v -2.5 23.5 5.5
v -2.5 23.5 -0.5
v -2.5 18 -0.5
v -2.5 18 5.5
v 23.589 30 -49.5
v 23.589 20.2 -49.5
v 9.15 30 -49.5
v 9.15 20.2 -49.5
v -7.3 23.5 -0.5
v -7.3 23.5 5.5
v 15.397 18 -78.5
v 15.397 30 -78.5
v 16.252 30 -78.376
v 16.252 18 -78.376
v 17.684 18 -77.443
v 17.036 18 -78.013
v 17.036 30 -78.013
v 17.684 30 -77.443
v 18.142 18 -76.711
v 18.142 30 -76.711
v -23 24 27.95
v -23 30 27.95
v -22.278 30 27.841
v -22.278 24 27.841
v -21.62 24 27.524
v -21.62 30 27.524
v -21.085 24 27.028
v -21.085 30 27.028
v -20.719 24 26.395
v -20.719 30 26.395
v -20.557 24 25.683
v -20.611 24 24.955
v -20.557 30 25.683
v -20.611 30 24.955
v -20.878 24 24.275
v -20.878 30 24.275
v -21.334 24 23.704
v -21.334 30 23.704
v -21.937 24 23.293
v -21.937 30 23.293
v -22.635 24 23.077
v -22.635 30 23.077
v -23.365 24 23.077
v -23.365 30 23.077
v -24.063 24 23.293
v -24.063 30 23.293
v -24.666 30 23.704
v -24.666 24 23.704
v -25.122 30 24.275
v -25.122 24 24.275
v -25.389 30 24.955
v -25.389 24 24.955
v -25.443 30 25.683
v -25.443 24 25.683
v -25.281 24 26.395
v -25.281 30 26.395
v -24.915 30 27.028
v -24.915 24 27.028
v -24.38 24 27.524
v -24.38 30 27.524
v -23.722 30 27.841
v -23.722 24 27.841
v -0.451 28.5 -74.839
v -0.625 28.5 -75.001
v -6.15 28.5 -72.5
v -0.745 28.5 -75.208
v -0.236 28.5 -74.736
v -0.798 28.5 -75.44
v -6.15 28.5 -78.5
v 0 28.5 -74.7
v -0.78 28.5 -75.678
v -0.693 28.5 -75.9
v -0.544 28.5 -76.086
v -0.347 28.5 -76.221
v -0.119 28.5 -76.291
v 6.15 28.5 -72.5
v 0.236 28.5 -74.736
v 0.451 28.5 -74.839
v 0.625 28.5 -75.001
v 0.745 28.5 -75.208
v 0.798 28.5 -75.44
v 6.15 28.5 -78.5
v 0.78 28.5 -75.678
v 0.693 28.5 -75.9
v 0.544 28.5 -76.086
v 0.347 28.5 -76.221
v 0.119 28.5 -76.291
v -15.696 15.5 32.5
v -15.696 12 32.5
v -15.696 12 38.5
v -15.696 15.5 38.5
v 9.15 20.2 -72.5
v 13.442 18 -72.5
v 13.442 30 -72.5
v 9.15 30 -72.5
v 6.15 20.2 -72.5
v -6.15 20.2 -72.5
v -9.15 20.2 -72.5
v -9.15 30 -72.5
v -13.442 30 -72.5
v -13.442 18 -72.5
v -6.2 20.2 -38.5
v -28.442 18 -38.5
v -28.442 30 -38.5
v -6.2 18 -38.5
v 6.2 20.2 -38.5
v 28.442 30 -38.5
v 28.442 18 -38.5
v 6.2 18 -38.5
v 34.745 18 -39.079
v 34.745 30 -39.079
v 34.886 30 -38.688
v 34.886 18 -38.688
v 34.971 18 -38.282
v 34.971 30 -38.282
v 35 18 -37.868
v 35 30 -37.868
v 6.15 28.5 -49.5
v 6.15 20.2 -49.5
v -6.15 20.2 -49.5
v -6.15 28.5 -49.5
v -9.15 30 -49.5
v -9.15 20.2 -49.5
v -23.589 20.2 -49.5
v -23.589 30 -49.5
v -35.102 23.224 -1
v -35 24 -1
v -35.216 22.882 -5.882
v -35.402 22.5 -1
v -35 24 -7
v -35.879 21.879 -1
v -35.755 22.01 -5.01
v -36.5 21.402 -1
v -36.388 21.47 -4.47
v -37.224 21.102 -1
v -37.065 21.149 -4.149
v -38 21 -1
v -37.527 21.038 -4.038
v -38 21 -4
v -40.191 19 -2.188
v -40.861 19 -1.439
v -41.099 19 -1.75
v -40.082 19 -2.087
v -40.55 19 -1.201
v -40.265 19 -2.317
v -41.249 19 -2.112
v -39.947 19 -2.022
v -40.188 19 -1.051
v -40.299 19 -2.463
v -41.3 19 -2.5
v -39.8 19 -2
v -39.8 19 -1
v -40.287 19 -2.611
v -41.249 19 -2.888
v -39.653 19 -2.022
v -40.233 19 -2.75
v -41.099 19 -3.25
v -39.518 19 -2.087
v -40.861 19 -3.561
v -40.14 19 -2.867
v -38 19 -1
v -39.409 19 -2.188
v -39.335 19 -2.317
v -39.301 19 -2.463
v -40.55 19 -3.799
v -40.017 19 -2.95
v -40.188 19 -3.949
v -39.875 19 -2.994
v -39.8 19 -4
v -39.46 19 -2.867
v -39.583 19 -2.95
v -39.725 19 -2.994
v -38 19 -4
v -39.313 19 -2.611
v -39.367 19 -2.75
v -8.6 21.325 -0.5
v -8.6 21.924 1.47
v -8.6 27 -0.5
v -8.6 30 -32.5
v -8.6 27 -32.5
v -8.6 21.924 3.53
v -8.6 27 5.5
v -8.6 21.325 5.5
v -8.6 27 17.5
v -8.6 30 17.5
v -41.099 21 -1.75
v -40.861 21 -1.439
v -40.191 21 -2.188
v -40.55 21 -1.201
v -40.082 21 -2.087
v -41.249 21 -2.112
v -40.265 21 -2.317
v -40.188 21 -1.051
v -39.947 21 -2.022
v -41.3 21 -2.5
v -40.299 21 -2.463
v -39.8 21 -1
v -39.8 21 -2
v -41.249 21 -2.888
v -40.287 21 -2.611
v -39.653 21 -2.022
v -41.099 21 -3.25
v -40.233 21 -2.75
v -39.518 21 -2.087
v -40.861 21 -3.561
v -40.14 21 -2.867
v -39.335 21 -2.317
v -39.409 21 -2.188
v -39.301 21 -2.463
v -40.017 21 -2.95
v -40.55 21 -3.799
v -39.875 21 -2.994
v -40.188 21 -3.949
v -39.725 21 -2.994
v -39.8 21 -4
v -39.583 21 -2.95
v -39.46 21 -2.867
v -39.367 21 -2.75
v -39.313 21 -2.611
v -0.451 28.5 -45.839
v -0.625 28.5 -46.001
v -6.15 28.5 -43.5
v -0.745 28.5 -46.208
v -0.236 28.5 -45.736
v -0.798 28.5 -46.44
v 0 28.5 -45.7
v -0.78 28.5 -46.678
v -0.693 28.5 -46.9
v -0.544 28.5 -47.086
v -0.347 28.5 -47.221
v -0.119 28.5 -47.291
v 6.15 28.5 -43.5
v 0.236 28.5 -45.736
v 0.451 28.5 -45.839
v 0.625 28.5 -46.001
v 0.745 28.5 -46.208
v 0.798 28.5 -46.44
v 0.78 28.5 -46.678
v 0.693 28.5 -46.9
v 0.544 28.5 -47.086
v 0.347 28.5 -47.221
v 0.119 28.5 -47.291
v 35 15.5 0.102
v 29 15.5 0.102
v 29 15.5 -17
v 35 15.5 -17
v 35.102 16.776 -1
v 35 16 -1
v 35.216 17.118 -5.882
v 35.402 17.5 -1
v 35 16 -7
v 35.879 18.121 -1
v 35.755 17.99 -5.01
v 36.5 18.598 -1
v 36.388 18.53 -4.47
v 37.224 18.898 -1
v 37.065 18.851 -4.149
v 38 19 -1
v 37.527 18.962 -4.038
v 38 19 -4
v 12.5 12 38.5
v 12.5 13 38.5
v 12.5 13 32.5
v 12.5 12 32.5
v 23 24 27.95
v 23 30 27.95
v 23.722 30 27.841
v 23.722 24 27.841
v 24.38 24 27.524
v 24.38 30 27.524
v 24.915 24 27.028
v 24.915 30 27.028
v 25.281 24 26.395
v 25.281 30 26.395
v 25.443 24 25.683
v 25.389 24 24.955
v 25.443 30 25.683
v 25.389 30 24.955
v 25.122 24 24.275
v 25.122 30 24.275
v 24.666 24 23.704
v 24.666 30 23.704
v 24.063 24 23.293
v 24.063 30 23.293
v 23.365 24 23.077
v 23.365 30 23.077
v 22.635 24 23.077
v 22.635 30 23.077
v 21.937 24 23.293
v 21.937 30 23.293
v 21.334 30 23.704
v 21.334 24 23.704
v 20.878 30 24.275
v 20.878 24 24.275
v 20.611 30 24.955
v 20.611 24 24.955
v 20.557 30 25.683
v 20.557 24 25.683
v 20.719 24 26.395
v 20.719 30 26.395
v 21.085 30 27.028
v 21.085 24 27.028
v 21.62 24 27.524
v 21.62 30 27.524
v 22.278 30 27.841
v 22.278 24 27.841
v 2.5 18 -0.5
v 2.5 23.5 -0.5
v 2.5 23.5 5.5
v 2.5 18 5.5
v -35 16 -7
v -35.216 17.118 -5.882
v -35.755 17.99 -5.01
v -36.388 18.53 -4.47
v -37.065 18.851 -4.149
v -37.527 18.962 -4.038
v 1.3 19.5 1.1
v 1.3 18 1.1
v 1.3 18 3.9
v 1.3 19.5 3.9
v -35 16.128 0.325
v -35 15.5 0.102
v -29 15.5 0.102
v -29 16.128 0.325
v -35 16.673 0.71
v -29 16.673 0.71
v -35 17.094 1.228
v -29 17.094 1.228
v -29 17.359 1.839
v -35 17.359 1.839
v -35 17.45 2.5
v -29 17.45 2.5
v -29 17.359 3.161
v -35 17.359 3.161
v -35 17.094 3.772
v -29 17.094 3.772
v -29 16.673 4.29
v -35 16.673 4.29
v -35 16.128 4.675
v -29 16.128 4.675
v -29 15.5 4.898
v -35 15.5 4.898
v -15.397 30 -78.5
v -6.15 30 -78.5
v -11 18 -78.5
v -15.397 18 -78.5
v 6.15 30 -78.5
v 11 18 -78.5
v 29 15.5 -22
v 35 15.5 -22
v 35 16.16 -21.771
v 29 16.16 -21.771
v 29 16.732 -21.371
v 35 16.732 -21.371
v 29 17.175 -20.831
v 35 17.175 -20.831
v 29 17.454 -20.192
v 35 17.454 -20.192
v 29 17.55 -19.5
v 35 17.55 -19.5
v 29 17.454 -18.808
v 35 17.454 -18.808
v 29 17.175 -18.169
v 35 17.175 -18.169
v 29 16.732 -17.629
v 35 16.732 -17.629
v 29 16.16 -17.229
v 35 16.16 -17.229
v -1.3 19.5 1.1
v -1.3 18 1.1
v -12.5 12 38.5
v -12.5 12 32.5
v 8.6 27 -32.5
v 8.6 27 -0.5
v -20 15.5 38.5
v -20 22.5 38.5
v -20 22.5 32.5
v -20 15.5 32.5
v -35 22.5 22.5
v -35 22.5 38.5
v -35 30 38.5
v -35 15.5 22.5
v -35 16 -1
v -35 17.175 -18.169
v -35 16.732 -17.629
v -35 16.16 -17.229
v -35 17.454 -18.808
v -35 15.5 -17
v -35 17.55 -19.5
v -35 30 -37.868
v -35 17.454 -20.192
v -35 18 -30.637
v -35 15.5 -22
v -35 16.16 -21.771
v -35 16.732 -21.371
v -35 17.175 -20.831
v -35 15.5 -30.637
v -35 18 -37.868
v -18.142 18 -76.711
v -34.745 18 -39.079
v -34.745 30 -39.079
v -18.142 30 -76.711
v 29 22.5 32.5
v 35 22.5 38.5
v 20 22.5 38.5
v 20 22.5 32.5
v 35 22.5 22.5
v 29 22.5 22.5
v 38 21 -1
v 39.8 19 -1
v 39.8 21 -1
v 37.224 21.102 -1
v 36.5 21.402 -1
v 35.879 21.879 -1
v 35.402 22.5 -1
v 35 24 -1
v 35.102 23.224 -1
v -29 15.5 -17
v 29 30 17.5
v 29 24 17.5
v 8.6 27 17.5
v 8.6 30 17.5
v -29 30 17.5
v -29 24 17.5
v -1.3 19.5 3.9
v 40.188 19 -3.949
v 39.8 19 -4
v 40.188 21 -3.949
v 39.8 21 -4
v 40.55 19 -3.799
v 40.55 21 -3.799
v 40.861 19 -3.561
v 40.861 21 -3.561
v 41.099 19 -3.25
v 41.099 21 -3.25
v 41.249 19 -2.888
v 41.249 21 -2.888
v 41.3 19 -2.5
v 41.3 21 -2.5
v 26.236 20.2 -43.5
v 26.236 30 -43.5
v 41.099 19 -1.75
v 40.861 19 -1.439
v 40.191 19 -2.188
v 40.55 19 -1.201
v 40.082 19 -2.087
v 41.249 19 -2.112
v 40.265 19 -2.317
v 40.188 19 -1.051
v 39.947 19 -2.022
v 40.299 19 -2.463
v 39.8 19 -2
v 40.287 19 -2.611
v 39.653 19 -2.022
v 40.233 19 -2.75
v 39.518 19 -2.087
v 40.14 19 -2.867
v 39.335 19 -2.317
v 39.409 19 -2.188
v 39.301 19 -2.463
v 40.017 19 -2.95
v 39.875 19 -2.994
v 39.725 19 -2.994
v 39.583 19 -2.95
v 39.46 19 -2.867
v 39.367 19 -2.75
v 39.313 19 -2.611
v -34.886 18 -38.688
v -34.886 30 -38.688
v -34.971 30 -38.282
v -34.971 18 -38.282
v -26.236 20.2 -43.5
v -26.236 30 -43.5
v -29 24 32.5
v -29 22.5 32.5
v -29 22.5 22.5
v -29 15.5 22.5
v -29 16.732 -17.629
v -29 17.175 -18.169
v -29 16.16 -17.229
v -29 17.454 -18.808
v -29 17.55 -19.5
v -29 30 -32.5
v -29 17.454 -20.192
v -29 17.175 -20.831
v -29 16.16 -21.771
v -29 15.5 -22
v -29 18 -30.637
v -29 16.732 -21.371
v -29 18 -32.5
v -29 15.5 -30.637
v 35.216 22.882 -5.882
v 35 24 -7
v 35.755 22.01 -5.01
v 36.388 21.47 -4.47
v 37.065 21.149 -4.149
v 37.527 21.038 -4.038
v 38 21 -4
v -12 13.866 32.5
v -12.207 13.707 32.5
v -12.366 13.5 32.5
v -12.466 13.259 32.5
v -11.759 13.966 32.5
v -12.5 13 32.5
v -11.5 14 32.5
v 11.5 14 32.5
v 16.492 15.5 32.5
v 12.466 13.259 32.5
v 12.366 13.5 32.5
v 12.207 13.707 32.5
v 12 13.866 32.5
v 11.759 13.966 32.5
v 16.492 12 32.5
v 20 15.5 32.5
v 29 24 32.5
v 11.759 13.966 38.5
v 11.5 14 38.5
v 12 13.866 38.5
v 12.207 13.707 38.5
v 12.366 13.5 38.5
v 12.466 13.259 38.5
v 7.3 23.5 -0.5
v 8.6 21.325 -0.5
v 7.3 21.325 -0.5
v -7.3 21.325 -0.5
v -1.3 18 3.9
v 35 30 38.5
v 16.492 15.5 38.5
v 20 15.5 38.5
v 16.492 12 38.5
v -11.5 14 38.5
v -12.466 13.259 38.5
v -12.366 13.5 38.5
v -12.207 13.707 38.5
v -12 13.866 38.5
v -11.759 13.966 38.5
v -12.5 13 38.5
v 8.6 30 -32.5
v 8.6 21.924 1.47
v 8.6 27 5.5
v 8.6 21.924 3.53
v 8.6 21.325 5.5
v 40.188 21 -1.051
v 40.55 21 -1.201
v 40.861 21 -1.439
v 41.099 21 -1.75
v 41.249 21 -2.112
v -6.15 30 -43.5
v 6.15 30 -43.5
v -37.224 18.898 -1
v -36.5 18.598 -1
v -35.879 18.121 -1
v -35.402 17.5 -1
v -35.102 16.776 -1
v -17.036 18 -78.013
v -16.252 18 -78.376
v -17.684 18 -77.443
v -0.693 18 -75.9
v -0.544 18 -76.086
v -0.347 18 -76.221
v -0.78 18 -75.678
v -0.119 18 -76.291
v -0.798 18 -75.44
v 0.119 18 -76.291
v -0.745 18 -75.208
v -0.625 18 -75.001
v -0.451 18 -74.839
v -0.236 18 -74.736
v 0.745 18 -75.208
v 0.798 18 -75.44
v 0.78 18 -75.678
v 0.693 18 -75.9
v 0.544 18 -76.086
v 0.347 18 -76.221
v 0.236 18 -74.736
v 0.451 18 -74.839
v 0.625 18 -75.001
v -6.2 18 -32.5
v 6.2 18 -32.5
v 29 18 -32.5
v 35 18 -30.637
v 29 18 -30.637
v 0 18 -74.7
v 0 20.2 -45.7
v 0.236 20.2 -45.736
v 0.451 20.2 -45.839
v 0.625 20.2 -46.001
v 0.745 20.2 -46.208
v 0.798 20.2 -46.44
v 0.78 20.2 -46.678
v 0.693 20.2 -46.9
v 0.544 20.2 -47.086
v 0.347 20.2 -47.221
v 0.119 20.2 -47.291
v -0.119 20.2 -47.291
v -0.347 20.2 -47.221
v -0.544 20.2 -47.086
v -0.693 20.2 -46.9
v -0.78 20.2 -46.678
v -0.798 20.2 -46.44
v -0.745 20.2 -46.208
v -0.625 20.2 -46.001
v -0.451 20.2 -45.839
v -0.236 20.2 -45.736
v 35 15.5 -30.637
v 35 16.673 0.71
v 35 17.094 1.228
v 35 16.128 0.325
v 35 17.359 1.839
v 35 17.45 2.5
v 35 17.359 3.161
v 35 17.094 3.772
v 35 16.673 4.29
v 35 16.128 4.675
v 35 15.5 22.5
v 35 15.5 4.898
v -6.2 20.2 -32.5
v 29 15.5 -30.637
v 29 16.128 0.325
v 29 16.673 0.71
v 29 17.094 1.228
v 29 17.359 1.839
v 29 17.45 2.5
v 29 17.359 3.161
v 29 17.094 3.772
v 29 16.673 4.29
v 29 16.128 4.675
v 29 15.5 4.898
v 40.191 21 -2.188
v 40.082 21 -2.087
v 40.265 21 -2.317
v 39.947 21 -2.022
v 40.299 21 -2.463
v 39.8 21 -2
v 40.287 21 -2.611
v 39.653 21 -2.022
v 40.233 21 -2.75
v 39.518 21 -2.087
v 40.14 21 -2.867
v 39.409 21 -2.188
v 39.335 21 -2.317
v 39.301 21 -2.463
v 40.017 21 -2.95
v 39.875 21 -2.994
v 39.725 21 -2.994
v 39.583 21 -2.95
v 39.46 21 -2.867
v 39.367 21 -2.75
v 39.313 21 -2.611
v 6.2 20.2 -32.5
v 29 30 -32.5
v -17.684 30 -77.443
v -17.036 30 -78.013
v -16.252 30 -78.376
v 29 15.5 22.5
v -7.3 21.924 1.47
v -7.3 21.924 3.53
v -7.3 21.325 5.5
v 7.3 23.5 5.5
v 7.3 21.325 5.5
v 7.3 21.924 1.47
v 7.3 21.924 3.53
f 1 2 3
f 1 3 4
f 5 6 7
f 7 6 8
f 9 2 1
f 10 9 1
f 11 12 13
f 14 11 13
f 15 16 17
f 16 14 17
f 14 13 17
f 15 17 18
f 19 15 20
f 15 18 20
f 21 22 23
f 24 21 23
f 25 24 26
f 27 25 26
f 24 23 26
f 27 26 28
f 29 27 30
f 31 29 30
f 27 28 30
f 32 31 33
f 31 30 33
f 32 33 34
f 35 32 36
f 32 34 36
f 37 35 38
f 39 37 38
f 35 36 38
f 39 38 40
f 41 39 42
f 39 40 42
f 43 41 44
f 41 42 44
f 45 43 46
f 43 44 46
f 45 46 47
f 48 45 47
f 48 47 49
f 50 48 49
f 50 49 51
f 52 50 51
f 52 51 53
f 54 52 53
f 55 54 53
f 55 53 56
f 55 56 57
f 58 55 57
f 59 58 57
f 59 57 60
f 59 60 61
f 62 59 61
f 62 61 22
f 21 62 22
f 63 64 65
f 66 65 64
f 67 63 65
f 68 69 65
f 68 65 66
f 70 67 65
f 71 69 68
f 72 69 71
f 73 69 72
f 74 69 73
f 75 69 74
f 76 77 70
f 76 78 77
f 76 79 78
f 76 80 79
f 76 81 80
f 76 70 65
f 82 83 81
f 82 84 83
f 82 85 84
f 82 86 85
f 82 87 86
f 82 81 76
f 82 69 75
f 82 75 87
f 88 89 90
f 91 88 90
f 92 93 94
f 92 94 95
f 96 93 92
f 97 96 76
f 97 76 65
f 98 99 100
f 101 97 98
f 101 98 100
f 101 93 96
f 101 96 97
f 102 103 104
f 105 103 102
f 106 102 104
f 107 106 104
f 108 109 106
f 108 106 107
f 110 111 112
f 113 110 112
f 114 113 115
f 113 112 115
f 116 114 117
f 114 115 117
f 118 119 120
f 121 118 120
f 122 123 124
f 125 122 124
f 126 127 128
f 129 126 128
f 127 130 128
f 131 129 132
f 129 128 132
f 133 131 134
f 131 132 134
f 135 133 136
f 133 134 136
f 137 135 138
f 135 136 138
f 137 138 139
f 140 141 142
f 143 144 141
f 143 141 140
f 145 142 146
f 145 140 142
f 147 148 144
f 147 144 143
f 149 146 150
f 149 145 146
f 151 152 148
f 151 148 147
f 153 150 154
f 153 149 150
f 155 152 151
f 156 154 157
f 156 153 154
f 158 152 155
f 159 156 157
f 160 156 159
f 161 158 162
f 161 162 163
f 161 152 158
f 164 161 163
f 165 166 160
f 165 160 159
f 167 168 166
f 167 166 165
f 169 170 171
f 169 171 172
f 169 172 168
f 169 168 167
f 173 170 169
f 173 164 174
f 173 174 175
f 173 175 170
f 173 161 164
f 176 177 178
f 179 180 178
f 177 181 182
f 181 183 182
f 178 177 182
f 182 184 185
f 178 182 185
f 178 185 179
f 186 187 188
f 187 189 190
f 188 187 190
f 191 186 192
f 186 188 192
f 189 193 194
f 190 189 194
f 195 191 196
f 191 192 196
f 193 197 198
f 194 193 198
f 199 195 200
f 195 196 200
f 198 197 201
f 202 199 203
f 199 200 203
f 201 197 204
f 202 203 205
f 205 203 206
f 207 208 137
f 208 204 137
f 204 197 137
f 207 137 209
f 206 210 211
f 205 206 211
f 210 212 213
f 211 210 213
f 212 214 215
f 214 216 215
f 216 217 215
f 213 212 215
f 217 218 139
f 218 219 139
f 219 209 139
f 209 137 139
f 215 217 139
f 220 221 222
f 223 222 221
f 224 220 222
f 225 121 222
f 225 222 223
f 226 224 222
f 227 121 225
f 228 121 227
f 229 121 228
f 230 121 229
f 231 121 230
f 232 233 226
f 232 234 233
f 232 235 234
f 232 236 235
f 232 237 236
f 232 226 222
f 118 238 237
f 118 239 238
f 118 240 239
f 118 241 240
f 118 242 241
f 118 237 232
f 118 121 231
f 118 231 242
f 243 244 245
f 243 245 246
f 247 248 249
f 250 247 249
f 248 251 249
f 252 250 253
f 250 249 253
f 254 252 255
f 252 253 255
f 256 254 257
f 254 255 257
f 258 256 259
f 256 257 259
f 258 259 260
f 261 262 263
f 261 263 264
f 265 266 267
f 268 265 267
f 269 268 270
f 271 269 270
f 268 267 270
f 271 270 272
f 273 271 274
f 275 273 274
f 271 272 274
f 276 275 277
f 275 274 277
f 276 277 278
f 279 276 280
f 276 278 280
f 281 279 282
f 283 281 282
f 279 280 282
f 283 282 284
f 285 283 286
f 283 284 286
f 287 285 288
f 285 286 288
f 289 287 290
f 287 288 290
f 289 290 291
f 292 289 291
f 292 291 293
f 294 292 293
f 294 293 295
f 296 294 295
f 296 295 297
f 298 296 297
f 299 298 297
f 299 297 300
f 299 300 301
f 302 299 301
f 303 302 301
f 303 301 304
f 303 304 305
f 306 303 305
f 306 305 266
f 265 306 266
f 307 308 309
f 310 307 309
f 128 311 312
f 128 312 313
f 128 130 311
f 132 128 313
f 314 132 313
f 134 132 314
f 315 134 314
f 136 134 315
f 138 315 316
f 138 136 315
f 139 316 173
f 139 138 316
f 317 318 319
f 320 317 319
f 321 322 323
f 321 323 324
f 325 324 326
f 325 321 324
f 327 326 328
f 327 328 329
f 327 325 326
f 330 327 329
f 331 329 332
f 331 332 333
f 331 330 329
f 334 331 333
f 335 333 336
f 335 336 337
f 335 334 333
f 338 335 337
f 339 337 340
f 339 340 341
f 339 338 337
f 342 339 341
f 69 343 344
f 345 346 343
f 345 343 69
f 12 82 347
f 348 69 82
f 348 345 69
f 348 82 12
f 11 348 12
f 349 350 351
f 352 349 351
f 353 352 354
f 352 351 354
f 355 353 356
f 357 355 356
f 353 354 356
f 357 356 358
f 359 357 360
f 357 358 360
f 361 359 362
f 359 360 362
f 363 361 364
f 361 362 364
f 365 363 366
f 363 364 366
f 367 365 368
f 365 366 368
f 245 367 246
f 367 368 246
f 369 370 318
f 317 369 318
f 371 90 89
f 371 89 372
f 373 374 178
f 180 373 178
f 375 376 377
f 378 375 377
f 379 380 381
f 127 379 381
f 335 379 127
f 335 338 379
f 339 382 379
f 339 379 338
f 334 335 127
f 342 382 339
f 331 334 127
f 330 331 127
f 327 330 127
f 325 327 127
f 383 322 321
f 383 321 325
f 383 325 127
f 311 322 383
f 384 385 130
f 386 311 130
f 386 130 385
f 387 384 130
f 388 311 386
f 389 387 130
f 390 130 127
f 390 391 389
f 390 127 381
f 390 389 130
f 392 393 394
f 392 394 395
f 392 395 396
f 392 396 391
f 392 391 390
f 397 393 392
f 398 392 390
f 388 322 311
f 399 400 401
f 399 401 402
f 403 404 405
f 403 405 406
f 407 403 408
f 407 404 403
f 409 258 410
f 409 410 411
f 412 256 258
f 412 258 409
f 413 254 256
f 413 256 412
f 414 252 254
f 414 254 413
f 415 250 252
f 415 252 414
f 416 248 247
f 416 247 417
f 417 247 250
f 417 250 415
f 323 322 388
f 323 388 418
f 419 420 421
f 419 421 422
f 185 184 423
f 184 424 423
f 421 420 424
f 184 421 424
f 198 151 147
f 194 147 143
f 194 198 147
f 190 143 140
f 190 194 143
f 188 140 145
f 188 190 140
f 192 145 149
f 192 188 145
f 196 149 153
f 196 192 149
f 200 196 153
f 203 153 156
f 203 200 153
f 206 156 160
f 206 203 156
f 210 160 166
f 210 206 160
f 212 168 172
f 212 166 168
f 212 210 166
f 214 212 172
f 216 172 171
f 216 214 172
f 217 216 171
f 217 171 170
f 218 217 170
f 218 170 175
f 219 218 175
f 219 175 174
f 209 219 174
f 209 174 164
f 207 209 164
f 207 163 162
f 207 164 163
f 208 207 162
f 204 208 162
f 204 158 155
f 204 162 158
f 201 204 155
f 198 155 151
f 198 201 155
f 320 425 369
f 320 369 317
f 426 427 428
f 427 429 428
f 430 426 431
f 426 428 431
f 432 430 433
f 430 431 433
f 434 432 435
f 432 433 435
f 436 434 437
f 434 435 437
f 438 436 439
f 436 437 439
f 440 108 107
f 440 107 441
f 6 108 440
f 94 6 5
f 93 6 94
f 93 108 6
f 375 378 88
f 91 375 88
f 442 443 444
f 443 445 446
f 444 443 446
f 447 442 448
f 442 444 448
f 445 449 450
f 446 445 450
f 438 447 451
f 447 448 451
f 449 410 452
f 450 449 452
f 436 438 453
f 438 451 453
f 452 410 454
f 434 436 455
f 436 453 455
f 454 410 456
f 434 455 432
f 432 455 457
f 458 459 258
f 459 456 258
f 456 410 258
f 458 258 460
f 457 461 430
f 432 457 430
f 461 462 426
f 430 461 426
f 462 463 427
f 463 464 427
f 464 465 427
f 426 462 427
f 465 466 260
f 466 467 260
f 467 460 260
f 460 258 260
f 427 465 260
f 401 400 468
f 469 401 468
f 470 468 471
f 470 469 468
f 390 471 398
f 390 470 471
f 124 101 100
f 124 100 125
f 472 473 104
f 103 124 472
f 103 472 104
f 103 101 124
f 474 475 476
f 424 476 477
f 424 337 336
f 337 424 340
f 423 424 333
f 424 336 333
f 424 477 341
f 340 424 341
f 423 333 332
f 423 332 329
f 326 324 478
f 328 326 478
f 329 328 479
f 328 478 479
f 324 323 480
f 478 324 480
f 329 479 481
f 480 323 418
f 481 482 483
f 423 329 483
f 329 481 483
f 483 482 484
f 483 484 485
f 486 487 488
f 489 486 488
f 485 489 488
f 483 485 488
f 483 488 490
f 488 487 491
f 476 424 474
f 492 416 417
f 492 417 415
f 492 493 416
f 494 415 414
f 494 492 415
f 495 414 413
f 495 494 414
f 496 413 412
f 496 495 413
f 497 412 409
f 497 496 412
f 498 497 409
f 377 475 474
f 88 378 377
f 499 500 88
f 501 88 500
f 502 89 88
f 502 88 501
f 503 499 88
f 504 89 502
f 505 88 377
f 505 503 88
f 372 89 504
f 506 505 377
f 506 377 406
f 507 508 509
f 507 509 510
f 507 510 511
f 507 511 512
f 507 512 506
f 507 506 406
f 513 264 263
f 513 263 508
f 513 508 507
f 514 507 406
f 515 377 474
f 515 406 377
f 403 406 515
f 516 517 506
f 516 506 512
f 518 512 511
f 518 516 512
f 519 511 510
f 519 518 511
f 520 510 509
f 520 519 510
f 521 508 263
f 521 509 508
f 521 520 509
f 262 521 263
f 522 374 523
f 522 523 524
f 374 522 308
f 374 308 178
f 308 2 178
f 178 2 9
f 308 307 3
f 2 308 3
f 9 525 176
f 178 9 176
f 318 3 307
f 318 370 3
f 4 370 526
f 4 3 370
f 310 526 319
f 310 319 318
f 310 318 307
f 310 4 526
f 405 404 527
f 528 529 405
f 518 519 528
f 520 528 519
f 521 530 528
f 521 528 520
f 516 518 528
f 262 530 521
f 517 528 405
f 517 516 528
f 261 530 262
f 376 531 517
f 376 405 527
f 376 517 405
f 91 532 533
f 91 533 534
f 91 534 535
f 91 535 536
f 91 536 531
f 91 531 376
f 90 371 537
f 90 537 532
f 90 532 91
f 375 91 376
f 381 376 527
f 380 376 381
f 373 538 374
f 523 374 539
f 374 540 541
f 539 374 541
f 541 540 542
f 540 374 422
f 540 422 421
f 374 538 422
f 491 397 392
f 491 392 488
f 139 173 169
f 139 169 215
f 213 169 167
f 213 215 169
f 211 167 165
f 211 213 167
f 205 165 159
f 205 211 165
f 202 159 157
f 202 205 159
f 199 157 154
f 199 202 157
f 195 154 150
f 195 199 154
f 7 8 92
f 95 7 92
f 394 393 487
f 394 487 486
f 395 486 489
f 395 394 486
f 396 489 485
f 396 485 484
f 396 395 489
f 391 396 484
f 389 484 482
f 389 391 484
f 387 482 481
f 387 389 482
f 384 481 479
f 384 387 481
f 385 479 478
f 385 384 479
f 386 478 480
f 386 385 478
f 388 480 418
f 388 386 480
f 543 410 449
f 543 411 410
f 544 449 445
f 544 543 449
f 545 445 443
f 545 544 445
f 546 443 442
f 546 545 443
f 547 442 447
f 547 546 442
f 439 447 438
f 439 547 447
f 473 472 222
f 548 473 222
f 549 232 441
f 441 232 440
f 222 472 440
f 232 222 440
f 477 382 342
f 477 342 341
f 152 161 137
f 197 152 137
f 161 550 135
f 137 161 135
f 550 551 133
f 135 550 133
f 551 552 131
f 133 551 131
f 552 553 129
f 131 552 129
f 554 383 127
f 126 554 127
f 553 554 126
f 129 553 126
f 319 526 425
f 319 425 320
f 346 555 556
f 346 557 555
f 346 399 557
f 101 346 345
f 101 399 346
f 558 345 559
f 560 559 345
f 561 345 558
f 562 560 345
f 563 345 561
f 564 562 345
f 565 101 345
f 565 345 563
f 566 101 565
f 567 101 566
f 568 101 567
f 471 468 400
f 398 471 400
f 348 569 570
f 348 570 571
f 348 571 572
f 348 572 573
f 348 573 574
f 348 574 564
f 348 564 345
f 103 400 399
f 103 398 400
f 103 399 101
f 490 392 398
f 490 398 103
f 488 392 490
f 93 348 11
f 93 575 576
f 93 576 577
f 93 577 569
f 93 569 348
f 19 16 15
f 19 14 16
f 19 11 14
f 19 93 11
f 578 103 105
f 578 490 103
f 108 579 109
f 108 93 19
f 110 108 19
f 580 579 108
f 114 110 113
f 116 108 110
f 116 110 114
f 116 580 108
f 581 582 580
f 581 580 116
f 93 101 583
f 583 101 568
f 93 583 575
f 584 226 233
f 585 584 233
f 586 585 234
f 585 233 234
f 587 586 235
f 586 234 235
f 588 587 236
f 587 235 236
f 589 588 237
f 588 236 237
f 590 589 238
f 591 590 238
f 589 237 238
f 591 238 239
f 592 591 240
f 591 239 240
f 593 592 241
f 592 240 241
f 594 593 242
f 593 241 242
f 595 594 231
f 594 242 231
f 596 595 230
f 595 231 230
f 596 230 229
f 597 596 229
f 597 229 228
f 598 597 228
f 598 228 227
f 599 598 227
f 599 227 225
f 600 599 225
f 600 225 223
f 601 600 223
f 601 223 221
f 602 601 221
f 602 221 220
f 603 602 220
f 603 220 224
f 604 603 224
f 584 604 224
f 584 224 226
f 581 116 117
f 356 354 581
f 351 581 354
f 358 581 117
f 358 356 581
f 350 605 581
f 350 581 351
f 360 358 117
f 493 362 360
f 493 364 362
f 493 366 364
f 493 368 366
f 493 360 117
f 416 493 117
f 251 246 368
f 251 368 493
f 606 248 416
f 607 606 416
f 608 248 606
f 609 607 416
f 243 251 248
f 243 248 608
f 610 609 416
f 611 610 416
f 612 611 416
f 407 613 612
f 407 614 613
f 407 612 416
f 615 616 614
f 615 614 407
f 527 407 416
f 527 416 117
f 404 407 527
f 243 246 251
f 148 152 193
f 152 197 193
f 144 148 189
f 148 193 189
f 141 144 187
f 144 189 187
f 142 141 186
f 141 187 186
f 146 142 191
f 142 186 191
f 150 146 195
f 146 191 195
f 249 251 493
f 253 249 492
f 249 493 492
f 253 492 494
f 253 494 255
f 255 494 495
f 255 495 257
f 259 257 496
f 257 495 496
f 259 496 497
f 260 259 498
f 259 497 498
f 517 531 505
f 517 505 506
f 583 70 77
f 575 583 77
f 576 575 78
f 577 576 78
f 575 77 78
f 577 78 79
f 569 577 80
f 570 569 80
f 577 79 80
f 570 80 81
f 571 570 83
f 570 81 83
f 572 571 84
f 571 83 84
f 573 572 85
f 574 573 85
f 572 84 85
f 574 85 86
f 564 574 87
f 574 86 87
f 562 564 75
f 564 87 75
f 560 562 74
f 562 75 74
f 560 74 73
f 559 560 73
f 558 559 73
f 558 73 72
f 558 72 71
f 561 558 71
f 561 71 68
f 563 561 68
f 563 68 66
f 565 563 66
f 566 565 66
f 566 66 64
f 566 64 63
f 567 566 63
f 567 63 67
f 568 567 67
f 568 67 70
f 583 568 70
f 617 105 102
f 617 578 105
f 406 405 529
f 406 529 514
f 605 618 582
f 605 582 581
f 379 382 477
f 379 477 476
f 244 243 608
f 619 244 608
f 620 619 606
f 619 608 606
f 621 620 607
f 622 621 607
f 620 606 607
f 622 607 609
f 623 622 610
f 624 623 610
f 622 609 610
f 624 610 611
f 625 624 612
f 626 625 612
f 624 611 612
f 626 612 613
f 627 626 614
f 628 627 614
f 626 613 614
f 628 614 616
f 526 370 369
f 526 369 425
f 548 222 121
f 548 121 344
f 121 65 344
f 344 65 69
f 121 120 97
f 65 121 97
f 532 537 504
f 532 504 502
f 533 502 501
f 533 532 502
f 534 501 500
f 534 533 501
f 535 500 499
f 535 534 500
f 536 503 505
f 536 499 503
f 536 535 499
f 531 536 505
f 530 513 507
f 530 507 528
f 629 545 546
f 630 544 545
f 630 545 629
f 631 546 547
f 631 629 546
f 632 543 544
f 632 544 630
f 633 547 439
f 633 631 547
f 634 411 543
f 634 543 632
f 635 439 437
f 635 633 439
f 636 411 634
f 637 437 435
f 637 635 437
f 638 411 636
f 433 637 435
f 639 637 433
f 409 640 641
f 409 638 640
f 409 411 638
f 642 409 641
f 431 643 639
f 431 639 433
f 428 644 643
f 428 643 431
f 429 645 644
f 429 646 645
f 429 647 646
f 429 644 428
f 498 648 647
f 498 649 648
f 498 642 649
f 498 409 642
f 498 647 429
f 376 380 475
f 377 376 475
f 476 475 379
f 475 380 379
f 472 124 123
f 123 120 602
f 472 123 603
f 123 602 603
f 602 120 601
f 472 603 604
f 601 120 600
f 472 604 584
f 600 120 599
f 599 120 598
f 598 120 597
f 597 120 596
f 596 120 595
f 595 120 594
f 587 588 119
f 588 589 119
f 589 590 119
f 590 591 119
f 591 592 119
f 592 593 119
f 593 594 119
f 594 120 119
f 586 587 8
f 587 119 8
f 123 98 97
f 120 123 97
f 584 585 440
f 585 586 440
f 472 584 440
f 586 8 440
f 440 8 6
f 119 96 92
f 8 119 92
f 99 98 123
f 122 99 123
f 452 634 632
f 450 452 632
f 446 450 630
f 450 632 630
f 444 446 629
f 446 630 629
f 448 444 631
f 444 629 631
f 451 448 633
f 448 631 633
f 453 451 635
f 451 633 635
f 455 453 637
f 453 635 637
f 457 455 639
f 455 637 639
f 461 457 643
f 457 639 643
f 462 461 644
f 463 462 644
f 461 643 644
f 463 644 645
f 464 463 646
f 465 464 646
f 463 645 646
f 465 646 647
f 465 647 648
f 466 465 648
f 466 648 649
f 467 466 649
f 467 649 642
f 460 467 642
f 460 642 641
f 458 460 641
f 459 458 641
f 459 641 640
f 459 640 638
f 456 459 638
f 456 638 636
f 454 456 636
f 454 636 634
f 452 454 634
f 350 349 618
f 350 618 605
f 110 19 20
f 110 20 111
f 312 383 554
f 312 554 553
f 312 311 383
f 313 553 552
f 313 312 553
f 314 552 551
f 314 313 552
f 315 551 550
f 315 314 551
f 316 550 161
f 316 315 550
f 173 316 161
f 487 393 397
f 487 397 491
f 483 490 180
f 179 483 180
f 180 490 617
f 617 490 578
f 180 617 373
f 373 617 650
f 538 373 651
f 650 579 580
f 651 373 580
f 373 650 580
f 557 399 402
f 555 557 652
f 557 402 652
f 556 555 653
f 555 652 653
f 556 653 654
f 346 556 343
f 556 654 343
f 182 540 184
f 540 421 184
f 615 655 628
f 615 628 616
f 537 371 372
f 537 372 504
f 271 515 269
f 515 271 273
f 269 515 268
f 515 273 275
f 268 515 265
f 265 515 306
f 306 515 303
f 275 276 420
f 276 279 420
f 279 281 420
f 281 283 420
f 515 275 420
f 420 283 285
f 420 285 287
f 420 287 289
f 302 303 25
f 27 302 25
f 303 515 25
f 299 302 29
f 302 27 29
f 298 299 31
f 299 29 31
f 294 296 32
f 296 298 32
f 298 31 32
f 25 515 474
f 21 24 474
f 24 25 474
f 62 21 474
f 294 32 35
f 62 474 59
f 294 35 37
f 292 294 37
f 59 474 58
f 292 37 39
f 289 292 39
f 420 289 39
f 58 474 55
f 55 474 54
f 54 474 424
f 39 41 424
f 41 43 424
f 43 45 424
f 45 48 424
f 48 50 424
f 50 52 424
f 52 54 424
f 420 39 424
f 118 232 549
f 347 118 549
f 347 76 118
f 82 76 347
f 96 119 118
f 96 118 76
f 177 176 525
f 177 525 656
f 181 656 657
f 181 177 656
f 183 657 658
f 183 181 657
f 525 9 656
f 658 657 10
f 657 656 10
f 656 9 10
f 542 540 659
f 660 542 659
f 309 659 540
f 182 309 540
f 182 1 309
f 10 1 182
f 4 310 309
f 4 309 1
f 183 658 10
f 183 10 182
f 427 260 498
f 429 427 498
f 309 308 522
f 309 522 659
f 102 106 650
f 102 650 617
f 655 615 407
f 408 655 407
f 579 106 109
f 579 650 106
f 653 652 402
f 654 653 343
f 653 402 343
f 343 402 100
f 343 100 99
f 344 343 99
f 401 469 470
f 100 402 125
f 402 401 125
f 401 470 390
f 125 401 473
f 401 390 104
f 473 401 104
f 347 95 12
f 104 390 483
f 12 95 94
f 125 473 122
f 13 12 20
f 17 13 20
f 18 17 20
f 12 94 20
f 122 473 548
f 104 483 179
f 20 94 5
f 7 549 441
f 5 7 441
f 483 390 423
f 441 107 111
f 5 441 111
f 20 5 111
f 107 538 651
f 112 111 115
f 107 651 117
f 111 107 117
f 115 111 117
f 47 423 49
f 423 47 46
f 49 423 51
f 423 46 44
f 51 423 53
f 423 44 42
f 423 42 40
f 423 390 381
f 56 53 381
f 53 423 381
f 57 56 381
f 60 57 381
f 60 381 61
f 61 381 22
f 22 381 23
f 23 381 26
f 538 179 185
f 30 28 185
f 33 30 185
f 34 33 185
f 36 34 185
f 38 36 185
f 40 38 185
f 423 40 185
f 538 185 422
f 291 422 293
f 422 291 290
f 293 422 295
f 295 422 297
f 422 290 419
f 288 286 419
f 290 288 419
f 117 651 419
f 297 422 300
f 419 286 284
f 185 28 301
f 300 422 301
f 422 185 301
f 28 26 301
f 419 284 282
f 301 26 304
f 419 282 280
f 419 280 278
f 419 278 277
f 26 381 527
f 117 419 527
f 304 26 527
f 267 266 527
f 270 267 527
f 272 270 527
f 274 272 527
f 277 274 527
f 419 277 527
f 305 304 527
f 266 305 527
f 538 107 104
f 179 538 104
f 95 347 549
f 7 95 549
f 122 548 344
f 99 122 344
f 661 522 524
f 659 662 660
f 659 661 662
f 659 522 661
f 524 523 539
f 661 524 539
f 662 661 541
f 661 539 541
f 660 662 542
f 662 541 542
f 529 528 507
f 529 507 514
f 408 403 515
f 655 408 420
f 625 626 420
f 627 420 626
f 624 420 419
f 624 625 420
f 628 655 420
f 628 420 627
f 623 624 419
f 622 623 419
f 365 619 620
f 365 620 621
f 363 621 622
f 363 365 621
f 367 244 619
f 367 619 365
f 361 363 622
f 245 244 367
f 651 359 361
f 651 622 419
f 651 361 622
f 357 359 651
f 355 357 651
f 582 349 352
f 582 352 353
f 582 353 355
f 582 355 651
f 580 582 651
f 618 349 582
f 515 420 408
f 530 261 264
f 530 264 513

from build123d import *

# Parameters (mm, degrees)
SKETCH1_W               = 58
SKETCH1_H               = 65
BOSS_EXTRUDE1_DEPTH     = 30
BOSS_EXTRUDE3_REACH     = 92.09
SKETCH10_W              = 5
SKETCH10_H              = 6
CUT_EXTRUDE1_REACH      = 111.372
SKETCH2_R               = 2.45
SKETCH2_R_2             = 2.55
CUT_EXTRUDE2_REACH      = 91.744
SKETCH3_W               = 12.4
SKETCH3_H               = 10.4
SKETCH11_W              = 3
SKETCH11_H              = 2
BOSS_EXTRUDE4_DEPTH     = 6.3
FILLET3_R               = 1.5
SKETCH12_R              = 0.5
CUT_EXTRUDE3_DEPTH      = 92.15338732
FILLET3_OF_MIRROR1_R    = 1.5
BOSS_EXTRUDE5_REACH     = 111.564
SKETCH13_W              = 15
SKETCH13_H              = 6
BOSS_EXTRUDE6_REACH     = 111.564
SKETCH17_W              = 15
SKETCH17_H              = 14
SKETCH14_R              = 2.45
CUT_EXTRUDE4_DEPTH      = 94.637279017
SKETCH16_W              = 16
SKETCH16_H              = 7
CUT_EXTRUDE7_DEPTH      = 15
CUT_EXTRUDE8_REACH      = 129.651
CUT_EXTRUDE9_START      = -6
SKETCH19_W              = 30
SKETCH19_H              = 15
CUT_EXTRUDE9_DEPTH      = 18
CUT_EXTRUDE18_REACH     = 129.651
SKETCH35_W              = 16
SKETCH35_H              = 6
FILLET5_R               = 3
BOSS_EXTRUDE7_START     = 20.2
BOSS_EXTRUDE7_DEPTH     = 9.8
CUT_EXTRUDE12_REACH     = 109.009
CUT_EXTRUDE12_START     = 16.5
SKETCH23_W              = 12.3
SKETCH23_H              = 6
BOSS_EXTRUDE8_DEPTH     = 20
CUT_EXTRUDE15_REACH     = 95.168
SKETCH28_R              = 0.8
FILLET4_R               = 3
CUT_EXTRUDE16_REACH     = 96.767
SKETCH29_R              = 1.6
SKETCH30_W              = 6
SKETCH30_H              = 3.5
BOSS_EXTRUDE9_DEPTH     = 6.1
SKETCH31_W              = 1.3
SKETCH31_H              = 6
BOSS_EXTRUDE10_DEPTH    = 5
CUT_EXTRUDE17_REACH     = 99.736
MIRROR5_COPY_1_SKETCH_W = 6
MIRROR5_COPY_1_SKETCH_H = 3.5
MIRROR5_COPY_1_DEPTH    = 6.1
MIRROR5_COPY_2_SKETCH_W = 1.3
MIRROR5_COPY_2_SKETCH_H = 6
MIRROR5_COPY_2_DEPTH    = 5
MIRROR5_COPY_3_REACH    = 99.736
SKETCH36_W              = 117.647989829
SKETCH36_H              = 130.366691432
CUT_EXTRUDE19_DEPTH     = 12
SKETCH37_W              = 122.41750293
SKETCH37_H              = 135.772139613
SKETCH37_W_2            = 32.18776844
SKETCH37_H_2            = 6
CUT_EXTRUDE20_DEPTH     = 3.5
SKETCH38_W              = 70
SKETCH38_H              = 47.863029623
SKETCH38_W_2            = 5
SKETCH38_H_2            = 6
CUT_EXTRUDE21_DEPTH     = 2.5
SKETCH39_W              = 2.6
SKETCH39_H              = 2.8
CUT_EXTRUDE22_DEPTH     = 1.5


with BuildPart() as part:
    # Sketch1 → Boss-Extrude1 (new body)
    with BuildSketch(Plane(origin=(0, 0, 0), x_dir=(1, 0, 0), z_dir=(0, 1, 0))):
        Polygon((-35, 38.5), (-17.352941176, 78.5), (17.352941947, 78.5), (35, 38.5), (35, -38.5), (-35, -38.5), align=None)
        Rectangle(SKETCH1_W, SKETCH1_H, mode=Mode.SUBTRACT)
        Polygon((-28.44203382, 38.5), (28.442033867, 38.5), (13.442034522, 72.5), (-13.44203382, 72.5), align=None, mode=Mode.SUBTRACT)
    extrude(amount=BOSS_EXTRUDE1_DEPTH)

    # Sketch7 → Loft3 section 0
    with BuildSketch(Plane.XY.offset(-32.5)):
        with BuildLine():
            Line((-8.6, 30), (8.6, 30))
            Line((8.6, 30), (8.6, 27))
            Line((8.6, 27), (-8.6, 27))
            Line((-8.6, 27), (-8.6, 30))
        make_face()
    # Sketch8 → Loft3 section 1
    with BuildSketch(Plane.XY.offset(5.5)):
        with BuildLine():
            Line((-8.6, 30), (8.6, 30))
            Line((8.6, 30), (8.6, 27))
            Line((8.6, 27), (-8.6, 27))
            Line((-8.6, 27), (-8.6, 30))
        make_face()
    loft3 = loft()

    # Mirror3: Loft3 across plane
    add(loft3.mirror(Plane(origin=(0, 15, 0), x_dir=(0, 0, 1), z_dir=(0, -1, 0))))

    # Sketch10 → Boss-Extrude3 (add, up to next)
    with BuildSketch(Plane.XZ.offset(-27), mode=Mode.PRIVATE) as boss_extrude3_sk1:
        with Locations((0, 2.5)):
            Rectangle(SKETCH10_W, SKETCH10_H)
    boss_extrude3_tool1 = extrude(boss_extrude3_sk1.sketch, amount=BOSS_EXTRUDE3_REACH, mode=Mode.PRIVATE) - part.part
    add(boss_extrude3_tool1.solids().sort_by_distance((0, 27, 2.5))[0])

    # Sketch2 → Cut-Extrude1 (cut, up to next)
    with BuildSketch(Plane(origin=(35, 0, 0), x_dir=(0, 0, -1), z_dir=(1, 0, 0)), mode=Mode.PRIVATE) as cut_extrude1_sk1:
        with Locations((-2.5, 15)):
            Circle(SKETCH2_R)
    cut_extrude1_tool1 = extrude(cut_extrude1_sk1.sketch, amount=-CUT_EXTRUDE1_REACH, mode=Mode.PRIVATE) & part.part
    # Sketch2 → Cut-Extrude1 (cut, up to next)
    with BuildSketch(Plane(origin=(35, 0, 0), x_dir=(0, 0, -1), z_dir=(1, 0, 0)), mode=Mode.PRIVATE) as cut_extrude1_sk2:
        with Locations((19.5, 15)):
            Circle(SKETCH2_R_2)
    cut_extrude1_tool2 = extrude(cut_extrude1_sk2.sketch, amount=-CUT_EXTRUDE1_REACH, mode=Mode.PRIVATE) & part.part
    cut_extrude1_1 = cut_extrude1_tool1.solids().sort_by_distance((35, 15, 2.5))[0]
    add(cut_extrude1_1, mode=Mode.SUBTRACT)
    cut_extrude1_2 = cut_extrude1_tool2.solids().sort_by_distance((35, 15, -19.5))[0]
    add(cut_extrude1_2, mode=Mode.SUBTRACT)
    cut_extrude1 = cut_extrude1_1 + cut_extrude1_2  # Cut-Extrude1 as one shape, for the pattern or mirror that repeats it

    # Sketch3 → Cut-Extrude2 (cut, up to next)
    with BuildSketch(Plane(origin=(0, 0, -38.5), x_dir=(-1, 0, 0), z_dir=(0, 0, -1)), mode=Mode.PRIVATE) as cut_extrude2_sk1:
        with Locations((0, 15)):
            Rectangle(SKETCH3_W, SKETCH3_H)
    cut_extrude2_tool1 = extrude(cut_extrude2_sk1.sketch, amount=-CUT_EXTRUDE2_REACH, mode=Mode.PRIVATE) & part.part
    add(cut_extrude2_tool1.solids().sort_by_distance((0, 15, -38.5))[0], mode=Mode.SUBTRACT)

    # Sketch11 → Boss-Extrude4 (add)
    with BuildSketch(Plane(origin=(35, 0, 0), x_dir=(0, 0, -1), z_dir=(1, 0, 0))):
        with Locations((2.5, 20)):
            Rectangle(SKETCH11_W, SKETCH11_H)
        with Locations((2.5, 10)):
            Rectangle(SKETCH11_W, SKETCH11_H)
    boss_extrude4 = extrude(amount=BOSS_EXTRUDE4_DEPTH)

    # Fillet3
    fillet3_edges = [part.edges().sort_by_distance(p)[0] for p in [
        (41.3, 10, -1),
        (41.3, 10, -4),
        (41.3, 20, -1),
        (41.3, 20, -4),
    ]]
    fillet(fillet3_edges, radius=FILLET3_R - 0.0001)  # a hair under: the kernel refuses the full size

    # Sketch12 → Cut-Extrude3 (cut, through all)
    with BuildSketch(Plane(origin=(0, 21, 0), x_dir=(1, 0, 0), z_dir=(0, 1, 0))):
        with Locations(Location((39.8, 2.5, 0), (0, 0, 270))):
            Circle(SKETCH12_R)
    cut_extrude3 = extrude(amount=-CUT_EXTRUDE3_DEPTH, mode=Mode.SUBTRACT)

    # Mirror1: Cut-Extrude1, Boss-Extrude4, Cut-Extrude3 across plane
    add(cut_extrude1.mirror(Plane(origin=(0, 0, 0), x_dir=(0, 0, 1), z_dir=(1, 0, 0))), mode=Mode.SUBTRACT)
    add(boss_extrude4.mirror(Plane(origin=(0, 0, 0), x_dir=(0, 0, 1), z_dir=(1, 0, 0))))
    add(cut_extrude3.mirror(Plane(origin=(0, 0, 0), x_dir=(0, 0, 1), z_dir=(1, 0, 0))), mode=Mode.SUBTRACT)

    # Fillet3 of Mirror1
    fillet3_of_mirror1_edges = [part.edges().sort_by_distance(p)[0] for p in [
        (-41.3, 10, -1),
        (-41.3, 10, -4),
        (-41.3, 20, -1),
        (-41.3, 20, -4),
    ]]
    fillet(fillet3_of_mirror1_edges, radius=FILLET3_OF_MIRROR1_R - 0.0001)  # a hair under: the kernel refuses the full size

    # Sketch13 → Boss-Extrude5 (add, up to next)
    with BuildSketch(Plane(origin=(-29, 0, 0), x_dir=(0, 0, -1), z_dir=(1, 0, 0)), mode=Mode.PRIVATE) as boss_extrude5_sk1:
        with Locations((-25, 27)):
            Rectangle(SKETCH13_W, SKETCH13_H)
    boss_extrude5_tool1 = extrude(boss_extrude5_sk1.sketch, amount=BOSS_EXTRUDE5_REACH, mode=Mode.PRIVATE) - part.part
    add(boss_extrude5_tool1.solids().sort_by_distance((-29, 27, 25))[0])

    # Sketch17 → Boss-Extrude6 (add, up to next)
    with BuildSketch(Plane(origin=(-29, 0, 0), x_dir=(0, 0, -1), z_dir=(1, 0, 0)), mode=Mode.PRIVATE) as boss_extrude6_sk1:
        with Locations((-25, 7)):
            Rectangle(SKETCH17_W, SKETCH17_H)
    boss_extrude6_tool1 = extrude(boss_extrude6_sk1.sketch, amount=BOSS_EXTRUDE6_REACH, mode=Mode.PRIVATE) - part.part
    add(boss_extrude6_tool1.solids().sort_by_distance((-29, 7, 25))[0])

    # Sketch14 → Cut-Extrude4 (cut, through all)
    with BuildSketch(Plane(origin=(0, 30, 0), x_dir=(1, 0, 0), z_dir=(0, 1, 0))):
        with Locations(Location((-23, -25.5, 0), (0, 0, 270))):
            Circle(SKETCH14_R)
        with Locations(Location((23, -25.5, 0), (0, 0, 270))):
            Circle(SKETCH14_R)
    extrude(amount=-CUT_EXTRUDE4_DEPTH, mode=Mode.SUBTRACT)

    # Sketch16 → Cut-Extrude7 (cut)
    with BuildSketch(Plane(origin=(35, 0, 0), x_dir=(0, 0, -1), z_dir=(1, 0, 0))):
        with Locations((-30.5, 19)):
            Rectangle(SKETCH16_W, SKETCH16_H)
    cut_extrude7 = extrude(amount=-CUT_EXTRUDE7_DEPTH, mode=Mode.SUBTRACT)

    # Mirror2: Cut-Extrude7 across plane
    add(cut_extrude7.mirror(Plane(origin=(0, 0, 0), x_dir=(0, 0, 1), z_dir=(1, 0, 0))), mode=Mode.SUBTRACT)

    # Sketch18 → Cut-Extrude8 (cut, up to next)
    with BuildSketch(Plane.XY.offset(38.5), mode=Mode.PRIVATE) as cut_extrude8_sk1:
        with BuildLine():
            Line((-11.5, 14), (11.5, 14))
            ThreePointArc((11.5, 14), (12.207106781, 13.707106781), (12.5, 13))
            Line((12.5, 13), (12.5, 11))
            ThreePointArc((12.5, 11), (12.207106781, 10.292893219), (11.5, 10))
            Line((11.5, 10), (-11.5, 10))
            ThreePointArc((-11.5, 10), (-12.207106781, 10.292893219), (-12.5, 11))
            Line((-12.5, 11), (-12.5, 13))
            ThreePointArc((-12.5, 13), (-12.207106781, 13.707106781), (-11.5, 14))
        make_face()
    cut_extrude8_tool1 = extrude(cut_extrude8_sk1.sketch, amount=-CUT_EXTRUDE8_REACH, mode=Mode.PRIVATE) & part.part
    add(cut_extrude8_tool1.solids().sort_by_distance((0, 12, 38.5))[0], mode=Mode.SUBTRACT)

    # Sketch19 → Cut-Extrude9 (cut)
    with BuildSketch(Plane(origin=(0, 30, 0), x_dir=(1, 0, 0), z_dir=(0, 1, 0)).offset(CUT_EXTRUDE9_START)):
        with Locations((0, -25)):
            Rectangle(SKETCH19_W, SKETCH19_H)
    extrude(amount=-CUT_EXTRUDE9_DEPTH, mode=Mode.SUBTRACT)

    # Sketch35 → Cut-Extrude18 (cut, up to next)
    with BuildSketch(Plane(origin=(0, 0, -78.5), x_dir=(-1, 0, 0), z_dir=(0, 0, -1)), mode=Mode.PRIVATE) as cut_extrude18_sk1:
        with Locations((0, 15)):
            Rectangle(SKETCH35_W, SKETCH35_H)
    cut_extrude18_tool1 = extrude(cut_extrude18_sk1.sketch, amount=-CUT_EXTRUDE18_REACH, mode=Mode.PRIVATE) & part.part
    add(cut_extrude18_tool1.solids().sort_by_distance((0, 15, -78.5))[0], mode=Mode.SUBTRACT)

    # Fillet5
    fillet5_edges = [part.edges().sort_by_distance(p)[0] for p in [
        (-35, 15, -38.5),
        (-17.352941176, 15, -78.5),
        (17.352941947, 15, -78.5),
        (35, 15, -38.5),
        (-8, 15, -78.5),
        (8, 15, -78.5),
    ]]
    fillet(fillet5_edges, radius=FILLET5_R)

    # Sketch24 → Boss-Extrude7 (add)
    with BuildSketch(Plane(origin=(0, 0, 0), x_dir=(1, 0, 0), z_dir=(0, 1, 0)).offset(BOSS_EXTRUDE7_START)):
        Polygon((9.15, 49.5), (9.15, 72.5), (6.15, 72.5), (6.15, 49.5), (-6.15, 49.5), (-6.15, 72.5), (-9.15, 72.5), (-9.15, 49.5), (-23.589092644, 49.5), (-26.23615161, 43.5), (26.23615161, 43.5), (23.589092902, 49.5), align=None)
    extrude(amount=BOSS_EXTRUDE7_DEPTH)

    # Sketch23 → Cut-Extrude12 (cut, up to next)
    with BuildSketch(Plane(origin=(0, 12, 0), x_dir=(1, 0, 0), z_dir=(0, 1, 0)).offset(CUT_EXTRUDE12_START), mode=Mode.PRIVATE) as cut_extrude12_sk1:
        with Locations((0, 75.5)):
            Rectangle(SKETCH23_W, SKETCH23_H)
    cut_extrude12_tool1 = extrude(cut_extrude12_sk1.sketch, amount=CUT_EXTRUDE12_REACH, mode=Mode.PRIVATE) & part.part
    # Sketch23 → Cut-Extrude12 (cut, up to next)
    with BuildSketch(Plane(origin=(0, 12, 0), x_dir=(1, 0, 0), z_dir=(0, 1, 0)).offset(CUT_EXTRUDE12_START), mode=Mode.PRIVATE) as cut_extrude12_sk2:
        with Locations((0, 46.5)):
            Rectangle(SKETCH23_W, SKETCH23_H)
    cut_extrude12_tool2 = extrude(cut_extrude12_sk2.sketch, amount=CUT_EXTRUDE12_REACH, mode=Mode.PRIVATE) & part.part
    add(cut_extrude12_tool1.solids().sort_by_distance((0, 28.5, -75.5))[0], mode=Mode.SUBTRACT)
    add(cut_extrude12_tool2.solids().sort_by_distance((0, 28.5, -46.5))[0], mode=Mode.SUBTRACT)

    # Sketch26 → Boss-Extrude8 (add)
    with BuildSketch(Plane(origin=(0, 0, -38.5), x_dir=(-1, 0, 0), z_dir=(0, 0, -1))):
        Polygon((-6.2, 9.8), (6.2, 9.8), (6.2, 12), (11.2, 12), (11.2, 4.8), (-11.2, 4.8), (-11.2, 12), (-6.2, 12), align=None)
    extrude(amount=BOSS_EXTRUDE8_DEPTH)

    # Sketch28 → Cut-Extrude15 (cut, up to next)
    with BuildSketch(Plane(origin=(0, 28.5, 0), x_dir=(-1, 0, 0), z_dir=(0, 1, 0)), mode=Mode.PRIVATE) as cut_extrude15_sk1:
        with Locations(Location((0, -46.5, 0), (0, 0, 90))):
            Circle(SKETCH28_R)
    cut_extrude15_tool1 = extrude(cut_extrude15_sk1.sketch, amount=-CUT_EXTRUDE15_REACH, mode=Mode.PRIVATE) & part.part
    # Sketch28 → Cut-Extrude15 (cut, up to next)
    with BuildSketch(Plane(origin=(0, 28.5, 0), x_dir=(-1, 0, 0), z_dir=(0, 1, 0)), mode=Mode.PRIVATE) as cut_extrude15_sk2:
        with Locations(Location((0, -75.5, 0), (0, 0, 90))):
            Circle(SKETCH28_R)
    cut_extrude15_tool2 = extrude(cut_extrude15_sk2.sketch, amount=-CUT_EXTRUDE15_REACH, mode=Mode.PRIVATE) & part.part
    add(cut_extrude15_tool1.solids().sort_by_distance((0, 28.5, -46.5))[0], mode=Mode.SUBTRACT)
    add(cut_extrude15_tool2.solids().sort_by_distance((0, 28.5, -75.5))[0], mode=Mode.SUBTRACT)

    # Fillet4
    fillet4_edges = [part.edges().sort_by_distance(p)[0] for p in [
        (35, 19, -2.5),
        (35, 20, -4),
        (35, 21, -2.5),
        (35, 11, -2.5),
        (35, 9, -2.5),
        (35, 10, -4),
        (-35, 19, -2.5),
        (-35, 20, -4),
        (-35, 21, -2.5),
        (-35, 11, -2.5),
        (-35, 9, -2.5),
        (-35, 10, -4),
    ]]
    fillet(fillet4_edges, radius=FILLET4_R)

    # Sketch29 → Cut-Extrude16 (cut, up to next)
    with BuildSketch(Plane(origin=(2.5, 0, 0), x_dir=(0, 0, -1), z_dir=(1, 0, 0)), mode=Mode.PRIVATE) as cut_extrude16_sk1:
        with Locations(Location((-2.5, 15, 0), (0, 0, 90))):
            Circle(SKETCH29_R)
    cut_extrude16_tool1 = extrude(cut_extrude16_sk1.sketch, amount=-CUT_EXTRUDE16_REACH, mode=Mode.PRIVATE) & part.part
    add(cut_extrude16_tool1.solids().sort_by_distance((2.5, 15, 2.5))[0], mode=Mode.SUBTRACT)

    # Sketch30 → Boss-Extrude9 (add)
    with BuildSketch(Plane.ZY.offset(2.5)):
        with Locations((2.5, 25.25)):
            Rectangle(SKETCH30_W, SKETCH30_H)
    boss_extrude9 = extrude(amount=BOSS_EXTRUDE9_DEPTH)

    # Sketch31 → Boss-Extrude10 (add)
    with BuildSketch(Plane.XZ.offset(-23.5)):
        with Locations((-7.95, 2.5)):
            Rectangle(SKETCH31_W, SKETCH31_H)
    boss_extrude10 = extrude(amount=BOSS_EXTRUDE10_DEPTH)

    # Sketch32 → Cut-Extrude17 (cut, up to next)
    with BuildSketch(Plane.ZY.offset(8.6), mode=Mode.PRIVATE) as cut_extrude17_sk1:
        with BuildLine():
            Line((-0.5, 18.5), (-0.5, 21.32455532))
            ThreePointArc((-0.5, 21.32455532), (2.5, 22), (5.5, 21.32455532))
            Line((5.5, 21.32455532), (5.5, 18.5))
            Line((5.5, 18.5), (-0.5, 18.5))
        make_face()
    cut_extrude17_tool1 = extrude(cut_extrude17_sk1.sketch, amount=-CUT_EXTRUDE17_REACH, mode=Mode.PRIVATE) & part.part
    cut_extrude17 = cut_extrude17_tool1.solids().sort_by_distance((-8.6, 20.145783, 2.5))[0]
    add(cut_extrude17, mode=Mode.SUBTRACT)

    # Mirror4: Boss-Extrude9, Boss-Extrude10, Cut-Extrude17 across plane
    add(boss_extrude9.mirror(Plane(origin=(0, 15, 0), x_dir=(0, 0, 1), z_dir=(0, -1, 0))))
    add(boss_extrude10.mirror(Plane(origin=(0, 15, 0), x_dir=(0, 0, 1), z_dir=(0, -1, 0))))
    add(cut_extrude17.mirror(Plane(origin=(0, 15, 0), x_dir=(0, 0, 1), z_dir=(0, -1, 0))), mode=Mode.SUBTRACT)

    # Mirror5: Boss-Extrude9, Boss-Extrude10, Cut-Extrude17 across plane
    add(boss_extrude9.mirror(Plane(origin=(0, 0, 0), x_dir=(0, 0, 1), z_dir=(1, 0, 0))))
    add(boss_extrude10.mirror(Plane(origin=(0, 0, 0), x_dir=(0, 0, 1), z_dir=(1, 0, 0))))
    add(cut_extrude17.mirror(Plane(origin=(0, 0, 0), x_dir=(0, 0, 1), z_dir=(1, 0, 0))), mode=Mode.SUBTRACT)

    # Mirror5 copy 1 sketch → Mirror5 copy 1 (add)
    with BuildSketch(Plane(origin=(2.5, 30, 0), x_dir=(0, 0, 1), z_dir=(1, 0, 0))):
        with Locations((2.5, 25.25)):
            Rectangle(MIRROR5_COPY_1_SKETCH_W, MIRROR5_COPY_1_SKETCH_H)
    extrude(amount=MIRROR5_COPY_1_DEPTH)

    # Mirror5 copy 2 sketch → Mirror5 copy 2 (add)
    with BuildSketch(Plane(origin=(0, 6.5, 0), x_dir=(-1, 0, 0), z_dir=(0, 1, 0))):
        with Locations((-7.95, 2.5)):
            Rectangle(MIRROR5_COPY_2_SKETCH_W, MIRROR5_COPY_2_SKETCH_H)
    extrude(amount=MIRROR5_COPY_2_DEPTH)

    # Mirror5 copy 3 sketch → Mirror5 copy 3 (cut, up to next)
    with BuildSketch(Plane(origin=(8.6, 30, 0), x_dir=(0, 0, 1), z_dir=(1, 0, 0)), mode=Mode.PRIVATE) as mirror5_copy_3_sk1:
        with BuildLine():
            Line((-0.5, 18.5), (-0.5, 21.32455532))
            ThreePointArc((-0.5, 21.32455532), (2.5, 22), (5.5, 21.32455532))
            Line((5.5, 21.32455532), (5.5, 18.5))
            Line((5.5, 18.5), (-0.5, 18.5))
        make_face()
    mirror5_copy_3_tool1 = extrude(mirror5_copy_3_sk1.sketch, amount=-MIRROR5_COPY_3_REACH, mode=Mode.PRIVATE) & part.part
    add(mirror5_copy_3_tool1.solids().sort_by_distance((8.6, 9.854217, 2.5))[0], mode=Mode.SUBTRACT)

    # Sketch33 → Loft4 section 0
    with BuildSketch(Plane.XY.offset(5.5)):
        with BuildLine():
            Line((-8.6, 30), (8.6, 30))
            Line((8.6, 30), (8.6, 27))
            Line((8.6, 27), (-8.6, 27))
            Line((-8.6, 27), (-8.6, 30))
        make_face()
    # Sketch34 → Loft4 section 1
    with BuildSketch(Plane(origin=(0, 0, 17.5), x_dir=(-1, 0, 0), z_dir=(0, 0, -1))):
        with BuildLine():
            Line((-8.6, 30), (8.6, 30))
            Line((8.6, 30), (8.6, 27))
            Line((8.6, 27), (-8.6, 27))
            Line((-8.6, 27), (-8.6, 30))
        make_face()
    loft4 = loft()

    # Mirror6: Loft4 across plane
    add(loft4.mirror(Plane(origin=(0, 15, 0), x_dir=(0, 0, 1), z_dir=(0, -1, 0))))

    # Sketch36 → Cut-Extrude19 (cut)
    with BuildSketch(Plane.XZ):
        with Locations((-2.588647032, -14.890240884)):
            Rectangle(SKETCH36_W, SKETCH36_H)
    extrude(amount=-CUT_EXTRUDE19_DEPTH, mode=Mode.SUBTRACT)

    # Sketch37 → Cut-Extrude20 (cut)
    with BuildSketch(Plane.XZ.offset(-12)):
        with Locations((9.01716818, -22.362478076)):
            Rectangle(SKETCH37_W, SKETCH37_H)
        with Locations((0.398006196, 35.5)):
            Rectangle(SKETCH37_W_2, SKETCH37_H_2, mode=Mode.SUBTRACT)
    extrude(amount=-CUT_EXTRUDE20_DEPTH, mode=Mode.SUBTRACT)

    # Sketch38 → Cut-Extrude21 (cut)
    with BuildSketch(Plane.XZ.offset(-15.5)):
        with Locations((0, -54.568485188)):
            Rectangle(SKETCH38_W, SKETCH38_H)
        with Locations((0, 2.5)):
            Rectangle(SKETCH38_W_2, SKETCH38_H_2)
    extrude(amount=-CUT_EXTRUDE21_DEPTH, mode=Mode.SUBTRACT)

    # Sketch39 → Cut-Extrude22 (cut)
    with BuildSketch(Plane.XZ.offset(-18)):
        with Locations((0, 2.5)):
            Rectangle(SKETCH39_W, SKETCH39_H)
    extrude(amount=-CUT_EXTRUDE22_DEPTH, mode=Mode.SUBTRACT)


solid = part.part
